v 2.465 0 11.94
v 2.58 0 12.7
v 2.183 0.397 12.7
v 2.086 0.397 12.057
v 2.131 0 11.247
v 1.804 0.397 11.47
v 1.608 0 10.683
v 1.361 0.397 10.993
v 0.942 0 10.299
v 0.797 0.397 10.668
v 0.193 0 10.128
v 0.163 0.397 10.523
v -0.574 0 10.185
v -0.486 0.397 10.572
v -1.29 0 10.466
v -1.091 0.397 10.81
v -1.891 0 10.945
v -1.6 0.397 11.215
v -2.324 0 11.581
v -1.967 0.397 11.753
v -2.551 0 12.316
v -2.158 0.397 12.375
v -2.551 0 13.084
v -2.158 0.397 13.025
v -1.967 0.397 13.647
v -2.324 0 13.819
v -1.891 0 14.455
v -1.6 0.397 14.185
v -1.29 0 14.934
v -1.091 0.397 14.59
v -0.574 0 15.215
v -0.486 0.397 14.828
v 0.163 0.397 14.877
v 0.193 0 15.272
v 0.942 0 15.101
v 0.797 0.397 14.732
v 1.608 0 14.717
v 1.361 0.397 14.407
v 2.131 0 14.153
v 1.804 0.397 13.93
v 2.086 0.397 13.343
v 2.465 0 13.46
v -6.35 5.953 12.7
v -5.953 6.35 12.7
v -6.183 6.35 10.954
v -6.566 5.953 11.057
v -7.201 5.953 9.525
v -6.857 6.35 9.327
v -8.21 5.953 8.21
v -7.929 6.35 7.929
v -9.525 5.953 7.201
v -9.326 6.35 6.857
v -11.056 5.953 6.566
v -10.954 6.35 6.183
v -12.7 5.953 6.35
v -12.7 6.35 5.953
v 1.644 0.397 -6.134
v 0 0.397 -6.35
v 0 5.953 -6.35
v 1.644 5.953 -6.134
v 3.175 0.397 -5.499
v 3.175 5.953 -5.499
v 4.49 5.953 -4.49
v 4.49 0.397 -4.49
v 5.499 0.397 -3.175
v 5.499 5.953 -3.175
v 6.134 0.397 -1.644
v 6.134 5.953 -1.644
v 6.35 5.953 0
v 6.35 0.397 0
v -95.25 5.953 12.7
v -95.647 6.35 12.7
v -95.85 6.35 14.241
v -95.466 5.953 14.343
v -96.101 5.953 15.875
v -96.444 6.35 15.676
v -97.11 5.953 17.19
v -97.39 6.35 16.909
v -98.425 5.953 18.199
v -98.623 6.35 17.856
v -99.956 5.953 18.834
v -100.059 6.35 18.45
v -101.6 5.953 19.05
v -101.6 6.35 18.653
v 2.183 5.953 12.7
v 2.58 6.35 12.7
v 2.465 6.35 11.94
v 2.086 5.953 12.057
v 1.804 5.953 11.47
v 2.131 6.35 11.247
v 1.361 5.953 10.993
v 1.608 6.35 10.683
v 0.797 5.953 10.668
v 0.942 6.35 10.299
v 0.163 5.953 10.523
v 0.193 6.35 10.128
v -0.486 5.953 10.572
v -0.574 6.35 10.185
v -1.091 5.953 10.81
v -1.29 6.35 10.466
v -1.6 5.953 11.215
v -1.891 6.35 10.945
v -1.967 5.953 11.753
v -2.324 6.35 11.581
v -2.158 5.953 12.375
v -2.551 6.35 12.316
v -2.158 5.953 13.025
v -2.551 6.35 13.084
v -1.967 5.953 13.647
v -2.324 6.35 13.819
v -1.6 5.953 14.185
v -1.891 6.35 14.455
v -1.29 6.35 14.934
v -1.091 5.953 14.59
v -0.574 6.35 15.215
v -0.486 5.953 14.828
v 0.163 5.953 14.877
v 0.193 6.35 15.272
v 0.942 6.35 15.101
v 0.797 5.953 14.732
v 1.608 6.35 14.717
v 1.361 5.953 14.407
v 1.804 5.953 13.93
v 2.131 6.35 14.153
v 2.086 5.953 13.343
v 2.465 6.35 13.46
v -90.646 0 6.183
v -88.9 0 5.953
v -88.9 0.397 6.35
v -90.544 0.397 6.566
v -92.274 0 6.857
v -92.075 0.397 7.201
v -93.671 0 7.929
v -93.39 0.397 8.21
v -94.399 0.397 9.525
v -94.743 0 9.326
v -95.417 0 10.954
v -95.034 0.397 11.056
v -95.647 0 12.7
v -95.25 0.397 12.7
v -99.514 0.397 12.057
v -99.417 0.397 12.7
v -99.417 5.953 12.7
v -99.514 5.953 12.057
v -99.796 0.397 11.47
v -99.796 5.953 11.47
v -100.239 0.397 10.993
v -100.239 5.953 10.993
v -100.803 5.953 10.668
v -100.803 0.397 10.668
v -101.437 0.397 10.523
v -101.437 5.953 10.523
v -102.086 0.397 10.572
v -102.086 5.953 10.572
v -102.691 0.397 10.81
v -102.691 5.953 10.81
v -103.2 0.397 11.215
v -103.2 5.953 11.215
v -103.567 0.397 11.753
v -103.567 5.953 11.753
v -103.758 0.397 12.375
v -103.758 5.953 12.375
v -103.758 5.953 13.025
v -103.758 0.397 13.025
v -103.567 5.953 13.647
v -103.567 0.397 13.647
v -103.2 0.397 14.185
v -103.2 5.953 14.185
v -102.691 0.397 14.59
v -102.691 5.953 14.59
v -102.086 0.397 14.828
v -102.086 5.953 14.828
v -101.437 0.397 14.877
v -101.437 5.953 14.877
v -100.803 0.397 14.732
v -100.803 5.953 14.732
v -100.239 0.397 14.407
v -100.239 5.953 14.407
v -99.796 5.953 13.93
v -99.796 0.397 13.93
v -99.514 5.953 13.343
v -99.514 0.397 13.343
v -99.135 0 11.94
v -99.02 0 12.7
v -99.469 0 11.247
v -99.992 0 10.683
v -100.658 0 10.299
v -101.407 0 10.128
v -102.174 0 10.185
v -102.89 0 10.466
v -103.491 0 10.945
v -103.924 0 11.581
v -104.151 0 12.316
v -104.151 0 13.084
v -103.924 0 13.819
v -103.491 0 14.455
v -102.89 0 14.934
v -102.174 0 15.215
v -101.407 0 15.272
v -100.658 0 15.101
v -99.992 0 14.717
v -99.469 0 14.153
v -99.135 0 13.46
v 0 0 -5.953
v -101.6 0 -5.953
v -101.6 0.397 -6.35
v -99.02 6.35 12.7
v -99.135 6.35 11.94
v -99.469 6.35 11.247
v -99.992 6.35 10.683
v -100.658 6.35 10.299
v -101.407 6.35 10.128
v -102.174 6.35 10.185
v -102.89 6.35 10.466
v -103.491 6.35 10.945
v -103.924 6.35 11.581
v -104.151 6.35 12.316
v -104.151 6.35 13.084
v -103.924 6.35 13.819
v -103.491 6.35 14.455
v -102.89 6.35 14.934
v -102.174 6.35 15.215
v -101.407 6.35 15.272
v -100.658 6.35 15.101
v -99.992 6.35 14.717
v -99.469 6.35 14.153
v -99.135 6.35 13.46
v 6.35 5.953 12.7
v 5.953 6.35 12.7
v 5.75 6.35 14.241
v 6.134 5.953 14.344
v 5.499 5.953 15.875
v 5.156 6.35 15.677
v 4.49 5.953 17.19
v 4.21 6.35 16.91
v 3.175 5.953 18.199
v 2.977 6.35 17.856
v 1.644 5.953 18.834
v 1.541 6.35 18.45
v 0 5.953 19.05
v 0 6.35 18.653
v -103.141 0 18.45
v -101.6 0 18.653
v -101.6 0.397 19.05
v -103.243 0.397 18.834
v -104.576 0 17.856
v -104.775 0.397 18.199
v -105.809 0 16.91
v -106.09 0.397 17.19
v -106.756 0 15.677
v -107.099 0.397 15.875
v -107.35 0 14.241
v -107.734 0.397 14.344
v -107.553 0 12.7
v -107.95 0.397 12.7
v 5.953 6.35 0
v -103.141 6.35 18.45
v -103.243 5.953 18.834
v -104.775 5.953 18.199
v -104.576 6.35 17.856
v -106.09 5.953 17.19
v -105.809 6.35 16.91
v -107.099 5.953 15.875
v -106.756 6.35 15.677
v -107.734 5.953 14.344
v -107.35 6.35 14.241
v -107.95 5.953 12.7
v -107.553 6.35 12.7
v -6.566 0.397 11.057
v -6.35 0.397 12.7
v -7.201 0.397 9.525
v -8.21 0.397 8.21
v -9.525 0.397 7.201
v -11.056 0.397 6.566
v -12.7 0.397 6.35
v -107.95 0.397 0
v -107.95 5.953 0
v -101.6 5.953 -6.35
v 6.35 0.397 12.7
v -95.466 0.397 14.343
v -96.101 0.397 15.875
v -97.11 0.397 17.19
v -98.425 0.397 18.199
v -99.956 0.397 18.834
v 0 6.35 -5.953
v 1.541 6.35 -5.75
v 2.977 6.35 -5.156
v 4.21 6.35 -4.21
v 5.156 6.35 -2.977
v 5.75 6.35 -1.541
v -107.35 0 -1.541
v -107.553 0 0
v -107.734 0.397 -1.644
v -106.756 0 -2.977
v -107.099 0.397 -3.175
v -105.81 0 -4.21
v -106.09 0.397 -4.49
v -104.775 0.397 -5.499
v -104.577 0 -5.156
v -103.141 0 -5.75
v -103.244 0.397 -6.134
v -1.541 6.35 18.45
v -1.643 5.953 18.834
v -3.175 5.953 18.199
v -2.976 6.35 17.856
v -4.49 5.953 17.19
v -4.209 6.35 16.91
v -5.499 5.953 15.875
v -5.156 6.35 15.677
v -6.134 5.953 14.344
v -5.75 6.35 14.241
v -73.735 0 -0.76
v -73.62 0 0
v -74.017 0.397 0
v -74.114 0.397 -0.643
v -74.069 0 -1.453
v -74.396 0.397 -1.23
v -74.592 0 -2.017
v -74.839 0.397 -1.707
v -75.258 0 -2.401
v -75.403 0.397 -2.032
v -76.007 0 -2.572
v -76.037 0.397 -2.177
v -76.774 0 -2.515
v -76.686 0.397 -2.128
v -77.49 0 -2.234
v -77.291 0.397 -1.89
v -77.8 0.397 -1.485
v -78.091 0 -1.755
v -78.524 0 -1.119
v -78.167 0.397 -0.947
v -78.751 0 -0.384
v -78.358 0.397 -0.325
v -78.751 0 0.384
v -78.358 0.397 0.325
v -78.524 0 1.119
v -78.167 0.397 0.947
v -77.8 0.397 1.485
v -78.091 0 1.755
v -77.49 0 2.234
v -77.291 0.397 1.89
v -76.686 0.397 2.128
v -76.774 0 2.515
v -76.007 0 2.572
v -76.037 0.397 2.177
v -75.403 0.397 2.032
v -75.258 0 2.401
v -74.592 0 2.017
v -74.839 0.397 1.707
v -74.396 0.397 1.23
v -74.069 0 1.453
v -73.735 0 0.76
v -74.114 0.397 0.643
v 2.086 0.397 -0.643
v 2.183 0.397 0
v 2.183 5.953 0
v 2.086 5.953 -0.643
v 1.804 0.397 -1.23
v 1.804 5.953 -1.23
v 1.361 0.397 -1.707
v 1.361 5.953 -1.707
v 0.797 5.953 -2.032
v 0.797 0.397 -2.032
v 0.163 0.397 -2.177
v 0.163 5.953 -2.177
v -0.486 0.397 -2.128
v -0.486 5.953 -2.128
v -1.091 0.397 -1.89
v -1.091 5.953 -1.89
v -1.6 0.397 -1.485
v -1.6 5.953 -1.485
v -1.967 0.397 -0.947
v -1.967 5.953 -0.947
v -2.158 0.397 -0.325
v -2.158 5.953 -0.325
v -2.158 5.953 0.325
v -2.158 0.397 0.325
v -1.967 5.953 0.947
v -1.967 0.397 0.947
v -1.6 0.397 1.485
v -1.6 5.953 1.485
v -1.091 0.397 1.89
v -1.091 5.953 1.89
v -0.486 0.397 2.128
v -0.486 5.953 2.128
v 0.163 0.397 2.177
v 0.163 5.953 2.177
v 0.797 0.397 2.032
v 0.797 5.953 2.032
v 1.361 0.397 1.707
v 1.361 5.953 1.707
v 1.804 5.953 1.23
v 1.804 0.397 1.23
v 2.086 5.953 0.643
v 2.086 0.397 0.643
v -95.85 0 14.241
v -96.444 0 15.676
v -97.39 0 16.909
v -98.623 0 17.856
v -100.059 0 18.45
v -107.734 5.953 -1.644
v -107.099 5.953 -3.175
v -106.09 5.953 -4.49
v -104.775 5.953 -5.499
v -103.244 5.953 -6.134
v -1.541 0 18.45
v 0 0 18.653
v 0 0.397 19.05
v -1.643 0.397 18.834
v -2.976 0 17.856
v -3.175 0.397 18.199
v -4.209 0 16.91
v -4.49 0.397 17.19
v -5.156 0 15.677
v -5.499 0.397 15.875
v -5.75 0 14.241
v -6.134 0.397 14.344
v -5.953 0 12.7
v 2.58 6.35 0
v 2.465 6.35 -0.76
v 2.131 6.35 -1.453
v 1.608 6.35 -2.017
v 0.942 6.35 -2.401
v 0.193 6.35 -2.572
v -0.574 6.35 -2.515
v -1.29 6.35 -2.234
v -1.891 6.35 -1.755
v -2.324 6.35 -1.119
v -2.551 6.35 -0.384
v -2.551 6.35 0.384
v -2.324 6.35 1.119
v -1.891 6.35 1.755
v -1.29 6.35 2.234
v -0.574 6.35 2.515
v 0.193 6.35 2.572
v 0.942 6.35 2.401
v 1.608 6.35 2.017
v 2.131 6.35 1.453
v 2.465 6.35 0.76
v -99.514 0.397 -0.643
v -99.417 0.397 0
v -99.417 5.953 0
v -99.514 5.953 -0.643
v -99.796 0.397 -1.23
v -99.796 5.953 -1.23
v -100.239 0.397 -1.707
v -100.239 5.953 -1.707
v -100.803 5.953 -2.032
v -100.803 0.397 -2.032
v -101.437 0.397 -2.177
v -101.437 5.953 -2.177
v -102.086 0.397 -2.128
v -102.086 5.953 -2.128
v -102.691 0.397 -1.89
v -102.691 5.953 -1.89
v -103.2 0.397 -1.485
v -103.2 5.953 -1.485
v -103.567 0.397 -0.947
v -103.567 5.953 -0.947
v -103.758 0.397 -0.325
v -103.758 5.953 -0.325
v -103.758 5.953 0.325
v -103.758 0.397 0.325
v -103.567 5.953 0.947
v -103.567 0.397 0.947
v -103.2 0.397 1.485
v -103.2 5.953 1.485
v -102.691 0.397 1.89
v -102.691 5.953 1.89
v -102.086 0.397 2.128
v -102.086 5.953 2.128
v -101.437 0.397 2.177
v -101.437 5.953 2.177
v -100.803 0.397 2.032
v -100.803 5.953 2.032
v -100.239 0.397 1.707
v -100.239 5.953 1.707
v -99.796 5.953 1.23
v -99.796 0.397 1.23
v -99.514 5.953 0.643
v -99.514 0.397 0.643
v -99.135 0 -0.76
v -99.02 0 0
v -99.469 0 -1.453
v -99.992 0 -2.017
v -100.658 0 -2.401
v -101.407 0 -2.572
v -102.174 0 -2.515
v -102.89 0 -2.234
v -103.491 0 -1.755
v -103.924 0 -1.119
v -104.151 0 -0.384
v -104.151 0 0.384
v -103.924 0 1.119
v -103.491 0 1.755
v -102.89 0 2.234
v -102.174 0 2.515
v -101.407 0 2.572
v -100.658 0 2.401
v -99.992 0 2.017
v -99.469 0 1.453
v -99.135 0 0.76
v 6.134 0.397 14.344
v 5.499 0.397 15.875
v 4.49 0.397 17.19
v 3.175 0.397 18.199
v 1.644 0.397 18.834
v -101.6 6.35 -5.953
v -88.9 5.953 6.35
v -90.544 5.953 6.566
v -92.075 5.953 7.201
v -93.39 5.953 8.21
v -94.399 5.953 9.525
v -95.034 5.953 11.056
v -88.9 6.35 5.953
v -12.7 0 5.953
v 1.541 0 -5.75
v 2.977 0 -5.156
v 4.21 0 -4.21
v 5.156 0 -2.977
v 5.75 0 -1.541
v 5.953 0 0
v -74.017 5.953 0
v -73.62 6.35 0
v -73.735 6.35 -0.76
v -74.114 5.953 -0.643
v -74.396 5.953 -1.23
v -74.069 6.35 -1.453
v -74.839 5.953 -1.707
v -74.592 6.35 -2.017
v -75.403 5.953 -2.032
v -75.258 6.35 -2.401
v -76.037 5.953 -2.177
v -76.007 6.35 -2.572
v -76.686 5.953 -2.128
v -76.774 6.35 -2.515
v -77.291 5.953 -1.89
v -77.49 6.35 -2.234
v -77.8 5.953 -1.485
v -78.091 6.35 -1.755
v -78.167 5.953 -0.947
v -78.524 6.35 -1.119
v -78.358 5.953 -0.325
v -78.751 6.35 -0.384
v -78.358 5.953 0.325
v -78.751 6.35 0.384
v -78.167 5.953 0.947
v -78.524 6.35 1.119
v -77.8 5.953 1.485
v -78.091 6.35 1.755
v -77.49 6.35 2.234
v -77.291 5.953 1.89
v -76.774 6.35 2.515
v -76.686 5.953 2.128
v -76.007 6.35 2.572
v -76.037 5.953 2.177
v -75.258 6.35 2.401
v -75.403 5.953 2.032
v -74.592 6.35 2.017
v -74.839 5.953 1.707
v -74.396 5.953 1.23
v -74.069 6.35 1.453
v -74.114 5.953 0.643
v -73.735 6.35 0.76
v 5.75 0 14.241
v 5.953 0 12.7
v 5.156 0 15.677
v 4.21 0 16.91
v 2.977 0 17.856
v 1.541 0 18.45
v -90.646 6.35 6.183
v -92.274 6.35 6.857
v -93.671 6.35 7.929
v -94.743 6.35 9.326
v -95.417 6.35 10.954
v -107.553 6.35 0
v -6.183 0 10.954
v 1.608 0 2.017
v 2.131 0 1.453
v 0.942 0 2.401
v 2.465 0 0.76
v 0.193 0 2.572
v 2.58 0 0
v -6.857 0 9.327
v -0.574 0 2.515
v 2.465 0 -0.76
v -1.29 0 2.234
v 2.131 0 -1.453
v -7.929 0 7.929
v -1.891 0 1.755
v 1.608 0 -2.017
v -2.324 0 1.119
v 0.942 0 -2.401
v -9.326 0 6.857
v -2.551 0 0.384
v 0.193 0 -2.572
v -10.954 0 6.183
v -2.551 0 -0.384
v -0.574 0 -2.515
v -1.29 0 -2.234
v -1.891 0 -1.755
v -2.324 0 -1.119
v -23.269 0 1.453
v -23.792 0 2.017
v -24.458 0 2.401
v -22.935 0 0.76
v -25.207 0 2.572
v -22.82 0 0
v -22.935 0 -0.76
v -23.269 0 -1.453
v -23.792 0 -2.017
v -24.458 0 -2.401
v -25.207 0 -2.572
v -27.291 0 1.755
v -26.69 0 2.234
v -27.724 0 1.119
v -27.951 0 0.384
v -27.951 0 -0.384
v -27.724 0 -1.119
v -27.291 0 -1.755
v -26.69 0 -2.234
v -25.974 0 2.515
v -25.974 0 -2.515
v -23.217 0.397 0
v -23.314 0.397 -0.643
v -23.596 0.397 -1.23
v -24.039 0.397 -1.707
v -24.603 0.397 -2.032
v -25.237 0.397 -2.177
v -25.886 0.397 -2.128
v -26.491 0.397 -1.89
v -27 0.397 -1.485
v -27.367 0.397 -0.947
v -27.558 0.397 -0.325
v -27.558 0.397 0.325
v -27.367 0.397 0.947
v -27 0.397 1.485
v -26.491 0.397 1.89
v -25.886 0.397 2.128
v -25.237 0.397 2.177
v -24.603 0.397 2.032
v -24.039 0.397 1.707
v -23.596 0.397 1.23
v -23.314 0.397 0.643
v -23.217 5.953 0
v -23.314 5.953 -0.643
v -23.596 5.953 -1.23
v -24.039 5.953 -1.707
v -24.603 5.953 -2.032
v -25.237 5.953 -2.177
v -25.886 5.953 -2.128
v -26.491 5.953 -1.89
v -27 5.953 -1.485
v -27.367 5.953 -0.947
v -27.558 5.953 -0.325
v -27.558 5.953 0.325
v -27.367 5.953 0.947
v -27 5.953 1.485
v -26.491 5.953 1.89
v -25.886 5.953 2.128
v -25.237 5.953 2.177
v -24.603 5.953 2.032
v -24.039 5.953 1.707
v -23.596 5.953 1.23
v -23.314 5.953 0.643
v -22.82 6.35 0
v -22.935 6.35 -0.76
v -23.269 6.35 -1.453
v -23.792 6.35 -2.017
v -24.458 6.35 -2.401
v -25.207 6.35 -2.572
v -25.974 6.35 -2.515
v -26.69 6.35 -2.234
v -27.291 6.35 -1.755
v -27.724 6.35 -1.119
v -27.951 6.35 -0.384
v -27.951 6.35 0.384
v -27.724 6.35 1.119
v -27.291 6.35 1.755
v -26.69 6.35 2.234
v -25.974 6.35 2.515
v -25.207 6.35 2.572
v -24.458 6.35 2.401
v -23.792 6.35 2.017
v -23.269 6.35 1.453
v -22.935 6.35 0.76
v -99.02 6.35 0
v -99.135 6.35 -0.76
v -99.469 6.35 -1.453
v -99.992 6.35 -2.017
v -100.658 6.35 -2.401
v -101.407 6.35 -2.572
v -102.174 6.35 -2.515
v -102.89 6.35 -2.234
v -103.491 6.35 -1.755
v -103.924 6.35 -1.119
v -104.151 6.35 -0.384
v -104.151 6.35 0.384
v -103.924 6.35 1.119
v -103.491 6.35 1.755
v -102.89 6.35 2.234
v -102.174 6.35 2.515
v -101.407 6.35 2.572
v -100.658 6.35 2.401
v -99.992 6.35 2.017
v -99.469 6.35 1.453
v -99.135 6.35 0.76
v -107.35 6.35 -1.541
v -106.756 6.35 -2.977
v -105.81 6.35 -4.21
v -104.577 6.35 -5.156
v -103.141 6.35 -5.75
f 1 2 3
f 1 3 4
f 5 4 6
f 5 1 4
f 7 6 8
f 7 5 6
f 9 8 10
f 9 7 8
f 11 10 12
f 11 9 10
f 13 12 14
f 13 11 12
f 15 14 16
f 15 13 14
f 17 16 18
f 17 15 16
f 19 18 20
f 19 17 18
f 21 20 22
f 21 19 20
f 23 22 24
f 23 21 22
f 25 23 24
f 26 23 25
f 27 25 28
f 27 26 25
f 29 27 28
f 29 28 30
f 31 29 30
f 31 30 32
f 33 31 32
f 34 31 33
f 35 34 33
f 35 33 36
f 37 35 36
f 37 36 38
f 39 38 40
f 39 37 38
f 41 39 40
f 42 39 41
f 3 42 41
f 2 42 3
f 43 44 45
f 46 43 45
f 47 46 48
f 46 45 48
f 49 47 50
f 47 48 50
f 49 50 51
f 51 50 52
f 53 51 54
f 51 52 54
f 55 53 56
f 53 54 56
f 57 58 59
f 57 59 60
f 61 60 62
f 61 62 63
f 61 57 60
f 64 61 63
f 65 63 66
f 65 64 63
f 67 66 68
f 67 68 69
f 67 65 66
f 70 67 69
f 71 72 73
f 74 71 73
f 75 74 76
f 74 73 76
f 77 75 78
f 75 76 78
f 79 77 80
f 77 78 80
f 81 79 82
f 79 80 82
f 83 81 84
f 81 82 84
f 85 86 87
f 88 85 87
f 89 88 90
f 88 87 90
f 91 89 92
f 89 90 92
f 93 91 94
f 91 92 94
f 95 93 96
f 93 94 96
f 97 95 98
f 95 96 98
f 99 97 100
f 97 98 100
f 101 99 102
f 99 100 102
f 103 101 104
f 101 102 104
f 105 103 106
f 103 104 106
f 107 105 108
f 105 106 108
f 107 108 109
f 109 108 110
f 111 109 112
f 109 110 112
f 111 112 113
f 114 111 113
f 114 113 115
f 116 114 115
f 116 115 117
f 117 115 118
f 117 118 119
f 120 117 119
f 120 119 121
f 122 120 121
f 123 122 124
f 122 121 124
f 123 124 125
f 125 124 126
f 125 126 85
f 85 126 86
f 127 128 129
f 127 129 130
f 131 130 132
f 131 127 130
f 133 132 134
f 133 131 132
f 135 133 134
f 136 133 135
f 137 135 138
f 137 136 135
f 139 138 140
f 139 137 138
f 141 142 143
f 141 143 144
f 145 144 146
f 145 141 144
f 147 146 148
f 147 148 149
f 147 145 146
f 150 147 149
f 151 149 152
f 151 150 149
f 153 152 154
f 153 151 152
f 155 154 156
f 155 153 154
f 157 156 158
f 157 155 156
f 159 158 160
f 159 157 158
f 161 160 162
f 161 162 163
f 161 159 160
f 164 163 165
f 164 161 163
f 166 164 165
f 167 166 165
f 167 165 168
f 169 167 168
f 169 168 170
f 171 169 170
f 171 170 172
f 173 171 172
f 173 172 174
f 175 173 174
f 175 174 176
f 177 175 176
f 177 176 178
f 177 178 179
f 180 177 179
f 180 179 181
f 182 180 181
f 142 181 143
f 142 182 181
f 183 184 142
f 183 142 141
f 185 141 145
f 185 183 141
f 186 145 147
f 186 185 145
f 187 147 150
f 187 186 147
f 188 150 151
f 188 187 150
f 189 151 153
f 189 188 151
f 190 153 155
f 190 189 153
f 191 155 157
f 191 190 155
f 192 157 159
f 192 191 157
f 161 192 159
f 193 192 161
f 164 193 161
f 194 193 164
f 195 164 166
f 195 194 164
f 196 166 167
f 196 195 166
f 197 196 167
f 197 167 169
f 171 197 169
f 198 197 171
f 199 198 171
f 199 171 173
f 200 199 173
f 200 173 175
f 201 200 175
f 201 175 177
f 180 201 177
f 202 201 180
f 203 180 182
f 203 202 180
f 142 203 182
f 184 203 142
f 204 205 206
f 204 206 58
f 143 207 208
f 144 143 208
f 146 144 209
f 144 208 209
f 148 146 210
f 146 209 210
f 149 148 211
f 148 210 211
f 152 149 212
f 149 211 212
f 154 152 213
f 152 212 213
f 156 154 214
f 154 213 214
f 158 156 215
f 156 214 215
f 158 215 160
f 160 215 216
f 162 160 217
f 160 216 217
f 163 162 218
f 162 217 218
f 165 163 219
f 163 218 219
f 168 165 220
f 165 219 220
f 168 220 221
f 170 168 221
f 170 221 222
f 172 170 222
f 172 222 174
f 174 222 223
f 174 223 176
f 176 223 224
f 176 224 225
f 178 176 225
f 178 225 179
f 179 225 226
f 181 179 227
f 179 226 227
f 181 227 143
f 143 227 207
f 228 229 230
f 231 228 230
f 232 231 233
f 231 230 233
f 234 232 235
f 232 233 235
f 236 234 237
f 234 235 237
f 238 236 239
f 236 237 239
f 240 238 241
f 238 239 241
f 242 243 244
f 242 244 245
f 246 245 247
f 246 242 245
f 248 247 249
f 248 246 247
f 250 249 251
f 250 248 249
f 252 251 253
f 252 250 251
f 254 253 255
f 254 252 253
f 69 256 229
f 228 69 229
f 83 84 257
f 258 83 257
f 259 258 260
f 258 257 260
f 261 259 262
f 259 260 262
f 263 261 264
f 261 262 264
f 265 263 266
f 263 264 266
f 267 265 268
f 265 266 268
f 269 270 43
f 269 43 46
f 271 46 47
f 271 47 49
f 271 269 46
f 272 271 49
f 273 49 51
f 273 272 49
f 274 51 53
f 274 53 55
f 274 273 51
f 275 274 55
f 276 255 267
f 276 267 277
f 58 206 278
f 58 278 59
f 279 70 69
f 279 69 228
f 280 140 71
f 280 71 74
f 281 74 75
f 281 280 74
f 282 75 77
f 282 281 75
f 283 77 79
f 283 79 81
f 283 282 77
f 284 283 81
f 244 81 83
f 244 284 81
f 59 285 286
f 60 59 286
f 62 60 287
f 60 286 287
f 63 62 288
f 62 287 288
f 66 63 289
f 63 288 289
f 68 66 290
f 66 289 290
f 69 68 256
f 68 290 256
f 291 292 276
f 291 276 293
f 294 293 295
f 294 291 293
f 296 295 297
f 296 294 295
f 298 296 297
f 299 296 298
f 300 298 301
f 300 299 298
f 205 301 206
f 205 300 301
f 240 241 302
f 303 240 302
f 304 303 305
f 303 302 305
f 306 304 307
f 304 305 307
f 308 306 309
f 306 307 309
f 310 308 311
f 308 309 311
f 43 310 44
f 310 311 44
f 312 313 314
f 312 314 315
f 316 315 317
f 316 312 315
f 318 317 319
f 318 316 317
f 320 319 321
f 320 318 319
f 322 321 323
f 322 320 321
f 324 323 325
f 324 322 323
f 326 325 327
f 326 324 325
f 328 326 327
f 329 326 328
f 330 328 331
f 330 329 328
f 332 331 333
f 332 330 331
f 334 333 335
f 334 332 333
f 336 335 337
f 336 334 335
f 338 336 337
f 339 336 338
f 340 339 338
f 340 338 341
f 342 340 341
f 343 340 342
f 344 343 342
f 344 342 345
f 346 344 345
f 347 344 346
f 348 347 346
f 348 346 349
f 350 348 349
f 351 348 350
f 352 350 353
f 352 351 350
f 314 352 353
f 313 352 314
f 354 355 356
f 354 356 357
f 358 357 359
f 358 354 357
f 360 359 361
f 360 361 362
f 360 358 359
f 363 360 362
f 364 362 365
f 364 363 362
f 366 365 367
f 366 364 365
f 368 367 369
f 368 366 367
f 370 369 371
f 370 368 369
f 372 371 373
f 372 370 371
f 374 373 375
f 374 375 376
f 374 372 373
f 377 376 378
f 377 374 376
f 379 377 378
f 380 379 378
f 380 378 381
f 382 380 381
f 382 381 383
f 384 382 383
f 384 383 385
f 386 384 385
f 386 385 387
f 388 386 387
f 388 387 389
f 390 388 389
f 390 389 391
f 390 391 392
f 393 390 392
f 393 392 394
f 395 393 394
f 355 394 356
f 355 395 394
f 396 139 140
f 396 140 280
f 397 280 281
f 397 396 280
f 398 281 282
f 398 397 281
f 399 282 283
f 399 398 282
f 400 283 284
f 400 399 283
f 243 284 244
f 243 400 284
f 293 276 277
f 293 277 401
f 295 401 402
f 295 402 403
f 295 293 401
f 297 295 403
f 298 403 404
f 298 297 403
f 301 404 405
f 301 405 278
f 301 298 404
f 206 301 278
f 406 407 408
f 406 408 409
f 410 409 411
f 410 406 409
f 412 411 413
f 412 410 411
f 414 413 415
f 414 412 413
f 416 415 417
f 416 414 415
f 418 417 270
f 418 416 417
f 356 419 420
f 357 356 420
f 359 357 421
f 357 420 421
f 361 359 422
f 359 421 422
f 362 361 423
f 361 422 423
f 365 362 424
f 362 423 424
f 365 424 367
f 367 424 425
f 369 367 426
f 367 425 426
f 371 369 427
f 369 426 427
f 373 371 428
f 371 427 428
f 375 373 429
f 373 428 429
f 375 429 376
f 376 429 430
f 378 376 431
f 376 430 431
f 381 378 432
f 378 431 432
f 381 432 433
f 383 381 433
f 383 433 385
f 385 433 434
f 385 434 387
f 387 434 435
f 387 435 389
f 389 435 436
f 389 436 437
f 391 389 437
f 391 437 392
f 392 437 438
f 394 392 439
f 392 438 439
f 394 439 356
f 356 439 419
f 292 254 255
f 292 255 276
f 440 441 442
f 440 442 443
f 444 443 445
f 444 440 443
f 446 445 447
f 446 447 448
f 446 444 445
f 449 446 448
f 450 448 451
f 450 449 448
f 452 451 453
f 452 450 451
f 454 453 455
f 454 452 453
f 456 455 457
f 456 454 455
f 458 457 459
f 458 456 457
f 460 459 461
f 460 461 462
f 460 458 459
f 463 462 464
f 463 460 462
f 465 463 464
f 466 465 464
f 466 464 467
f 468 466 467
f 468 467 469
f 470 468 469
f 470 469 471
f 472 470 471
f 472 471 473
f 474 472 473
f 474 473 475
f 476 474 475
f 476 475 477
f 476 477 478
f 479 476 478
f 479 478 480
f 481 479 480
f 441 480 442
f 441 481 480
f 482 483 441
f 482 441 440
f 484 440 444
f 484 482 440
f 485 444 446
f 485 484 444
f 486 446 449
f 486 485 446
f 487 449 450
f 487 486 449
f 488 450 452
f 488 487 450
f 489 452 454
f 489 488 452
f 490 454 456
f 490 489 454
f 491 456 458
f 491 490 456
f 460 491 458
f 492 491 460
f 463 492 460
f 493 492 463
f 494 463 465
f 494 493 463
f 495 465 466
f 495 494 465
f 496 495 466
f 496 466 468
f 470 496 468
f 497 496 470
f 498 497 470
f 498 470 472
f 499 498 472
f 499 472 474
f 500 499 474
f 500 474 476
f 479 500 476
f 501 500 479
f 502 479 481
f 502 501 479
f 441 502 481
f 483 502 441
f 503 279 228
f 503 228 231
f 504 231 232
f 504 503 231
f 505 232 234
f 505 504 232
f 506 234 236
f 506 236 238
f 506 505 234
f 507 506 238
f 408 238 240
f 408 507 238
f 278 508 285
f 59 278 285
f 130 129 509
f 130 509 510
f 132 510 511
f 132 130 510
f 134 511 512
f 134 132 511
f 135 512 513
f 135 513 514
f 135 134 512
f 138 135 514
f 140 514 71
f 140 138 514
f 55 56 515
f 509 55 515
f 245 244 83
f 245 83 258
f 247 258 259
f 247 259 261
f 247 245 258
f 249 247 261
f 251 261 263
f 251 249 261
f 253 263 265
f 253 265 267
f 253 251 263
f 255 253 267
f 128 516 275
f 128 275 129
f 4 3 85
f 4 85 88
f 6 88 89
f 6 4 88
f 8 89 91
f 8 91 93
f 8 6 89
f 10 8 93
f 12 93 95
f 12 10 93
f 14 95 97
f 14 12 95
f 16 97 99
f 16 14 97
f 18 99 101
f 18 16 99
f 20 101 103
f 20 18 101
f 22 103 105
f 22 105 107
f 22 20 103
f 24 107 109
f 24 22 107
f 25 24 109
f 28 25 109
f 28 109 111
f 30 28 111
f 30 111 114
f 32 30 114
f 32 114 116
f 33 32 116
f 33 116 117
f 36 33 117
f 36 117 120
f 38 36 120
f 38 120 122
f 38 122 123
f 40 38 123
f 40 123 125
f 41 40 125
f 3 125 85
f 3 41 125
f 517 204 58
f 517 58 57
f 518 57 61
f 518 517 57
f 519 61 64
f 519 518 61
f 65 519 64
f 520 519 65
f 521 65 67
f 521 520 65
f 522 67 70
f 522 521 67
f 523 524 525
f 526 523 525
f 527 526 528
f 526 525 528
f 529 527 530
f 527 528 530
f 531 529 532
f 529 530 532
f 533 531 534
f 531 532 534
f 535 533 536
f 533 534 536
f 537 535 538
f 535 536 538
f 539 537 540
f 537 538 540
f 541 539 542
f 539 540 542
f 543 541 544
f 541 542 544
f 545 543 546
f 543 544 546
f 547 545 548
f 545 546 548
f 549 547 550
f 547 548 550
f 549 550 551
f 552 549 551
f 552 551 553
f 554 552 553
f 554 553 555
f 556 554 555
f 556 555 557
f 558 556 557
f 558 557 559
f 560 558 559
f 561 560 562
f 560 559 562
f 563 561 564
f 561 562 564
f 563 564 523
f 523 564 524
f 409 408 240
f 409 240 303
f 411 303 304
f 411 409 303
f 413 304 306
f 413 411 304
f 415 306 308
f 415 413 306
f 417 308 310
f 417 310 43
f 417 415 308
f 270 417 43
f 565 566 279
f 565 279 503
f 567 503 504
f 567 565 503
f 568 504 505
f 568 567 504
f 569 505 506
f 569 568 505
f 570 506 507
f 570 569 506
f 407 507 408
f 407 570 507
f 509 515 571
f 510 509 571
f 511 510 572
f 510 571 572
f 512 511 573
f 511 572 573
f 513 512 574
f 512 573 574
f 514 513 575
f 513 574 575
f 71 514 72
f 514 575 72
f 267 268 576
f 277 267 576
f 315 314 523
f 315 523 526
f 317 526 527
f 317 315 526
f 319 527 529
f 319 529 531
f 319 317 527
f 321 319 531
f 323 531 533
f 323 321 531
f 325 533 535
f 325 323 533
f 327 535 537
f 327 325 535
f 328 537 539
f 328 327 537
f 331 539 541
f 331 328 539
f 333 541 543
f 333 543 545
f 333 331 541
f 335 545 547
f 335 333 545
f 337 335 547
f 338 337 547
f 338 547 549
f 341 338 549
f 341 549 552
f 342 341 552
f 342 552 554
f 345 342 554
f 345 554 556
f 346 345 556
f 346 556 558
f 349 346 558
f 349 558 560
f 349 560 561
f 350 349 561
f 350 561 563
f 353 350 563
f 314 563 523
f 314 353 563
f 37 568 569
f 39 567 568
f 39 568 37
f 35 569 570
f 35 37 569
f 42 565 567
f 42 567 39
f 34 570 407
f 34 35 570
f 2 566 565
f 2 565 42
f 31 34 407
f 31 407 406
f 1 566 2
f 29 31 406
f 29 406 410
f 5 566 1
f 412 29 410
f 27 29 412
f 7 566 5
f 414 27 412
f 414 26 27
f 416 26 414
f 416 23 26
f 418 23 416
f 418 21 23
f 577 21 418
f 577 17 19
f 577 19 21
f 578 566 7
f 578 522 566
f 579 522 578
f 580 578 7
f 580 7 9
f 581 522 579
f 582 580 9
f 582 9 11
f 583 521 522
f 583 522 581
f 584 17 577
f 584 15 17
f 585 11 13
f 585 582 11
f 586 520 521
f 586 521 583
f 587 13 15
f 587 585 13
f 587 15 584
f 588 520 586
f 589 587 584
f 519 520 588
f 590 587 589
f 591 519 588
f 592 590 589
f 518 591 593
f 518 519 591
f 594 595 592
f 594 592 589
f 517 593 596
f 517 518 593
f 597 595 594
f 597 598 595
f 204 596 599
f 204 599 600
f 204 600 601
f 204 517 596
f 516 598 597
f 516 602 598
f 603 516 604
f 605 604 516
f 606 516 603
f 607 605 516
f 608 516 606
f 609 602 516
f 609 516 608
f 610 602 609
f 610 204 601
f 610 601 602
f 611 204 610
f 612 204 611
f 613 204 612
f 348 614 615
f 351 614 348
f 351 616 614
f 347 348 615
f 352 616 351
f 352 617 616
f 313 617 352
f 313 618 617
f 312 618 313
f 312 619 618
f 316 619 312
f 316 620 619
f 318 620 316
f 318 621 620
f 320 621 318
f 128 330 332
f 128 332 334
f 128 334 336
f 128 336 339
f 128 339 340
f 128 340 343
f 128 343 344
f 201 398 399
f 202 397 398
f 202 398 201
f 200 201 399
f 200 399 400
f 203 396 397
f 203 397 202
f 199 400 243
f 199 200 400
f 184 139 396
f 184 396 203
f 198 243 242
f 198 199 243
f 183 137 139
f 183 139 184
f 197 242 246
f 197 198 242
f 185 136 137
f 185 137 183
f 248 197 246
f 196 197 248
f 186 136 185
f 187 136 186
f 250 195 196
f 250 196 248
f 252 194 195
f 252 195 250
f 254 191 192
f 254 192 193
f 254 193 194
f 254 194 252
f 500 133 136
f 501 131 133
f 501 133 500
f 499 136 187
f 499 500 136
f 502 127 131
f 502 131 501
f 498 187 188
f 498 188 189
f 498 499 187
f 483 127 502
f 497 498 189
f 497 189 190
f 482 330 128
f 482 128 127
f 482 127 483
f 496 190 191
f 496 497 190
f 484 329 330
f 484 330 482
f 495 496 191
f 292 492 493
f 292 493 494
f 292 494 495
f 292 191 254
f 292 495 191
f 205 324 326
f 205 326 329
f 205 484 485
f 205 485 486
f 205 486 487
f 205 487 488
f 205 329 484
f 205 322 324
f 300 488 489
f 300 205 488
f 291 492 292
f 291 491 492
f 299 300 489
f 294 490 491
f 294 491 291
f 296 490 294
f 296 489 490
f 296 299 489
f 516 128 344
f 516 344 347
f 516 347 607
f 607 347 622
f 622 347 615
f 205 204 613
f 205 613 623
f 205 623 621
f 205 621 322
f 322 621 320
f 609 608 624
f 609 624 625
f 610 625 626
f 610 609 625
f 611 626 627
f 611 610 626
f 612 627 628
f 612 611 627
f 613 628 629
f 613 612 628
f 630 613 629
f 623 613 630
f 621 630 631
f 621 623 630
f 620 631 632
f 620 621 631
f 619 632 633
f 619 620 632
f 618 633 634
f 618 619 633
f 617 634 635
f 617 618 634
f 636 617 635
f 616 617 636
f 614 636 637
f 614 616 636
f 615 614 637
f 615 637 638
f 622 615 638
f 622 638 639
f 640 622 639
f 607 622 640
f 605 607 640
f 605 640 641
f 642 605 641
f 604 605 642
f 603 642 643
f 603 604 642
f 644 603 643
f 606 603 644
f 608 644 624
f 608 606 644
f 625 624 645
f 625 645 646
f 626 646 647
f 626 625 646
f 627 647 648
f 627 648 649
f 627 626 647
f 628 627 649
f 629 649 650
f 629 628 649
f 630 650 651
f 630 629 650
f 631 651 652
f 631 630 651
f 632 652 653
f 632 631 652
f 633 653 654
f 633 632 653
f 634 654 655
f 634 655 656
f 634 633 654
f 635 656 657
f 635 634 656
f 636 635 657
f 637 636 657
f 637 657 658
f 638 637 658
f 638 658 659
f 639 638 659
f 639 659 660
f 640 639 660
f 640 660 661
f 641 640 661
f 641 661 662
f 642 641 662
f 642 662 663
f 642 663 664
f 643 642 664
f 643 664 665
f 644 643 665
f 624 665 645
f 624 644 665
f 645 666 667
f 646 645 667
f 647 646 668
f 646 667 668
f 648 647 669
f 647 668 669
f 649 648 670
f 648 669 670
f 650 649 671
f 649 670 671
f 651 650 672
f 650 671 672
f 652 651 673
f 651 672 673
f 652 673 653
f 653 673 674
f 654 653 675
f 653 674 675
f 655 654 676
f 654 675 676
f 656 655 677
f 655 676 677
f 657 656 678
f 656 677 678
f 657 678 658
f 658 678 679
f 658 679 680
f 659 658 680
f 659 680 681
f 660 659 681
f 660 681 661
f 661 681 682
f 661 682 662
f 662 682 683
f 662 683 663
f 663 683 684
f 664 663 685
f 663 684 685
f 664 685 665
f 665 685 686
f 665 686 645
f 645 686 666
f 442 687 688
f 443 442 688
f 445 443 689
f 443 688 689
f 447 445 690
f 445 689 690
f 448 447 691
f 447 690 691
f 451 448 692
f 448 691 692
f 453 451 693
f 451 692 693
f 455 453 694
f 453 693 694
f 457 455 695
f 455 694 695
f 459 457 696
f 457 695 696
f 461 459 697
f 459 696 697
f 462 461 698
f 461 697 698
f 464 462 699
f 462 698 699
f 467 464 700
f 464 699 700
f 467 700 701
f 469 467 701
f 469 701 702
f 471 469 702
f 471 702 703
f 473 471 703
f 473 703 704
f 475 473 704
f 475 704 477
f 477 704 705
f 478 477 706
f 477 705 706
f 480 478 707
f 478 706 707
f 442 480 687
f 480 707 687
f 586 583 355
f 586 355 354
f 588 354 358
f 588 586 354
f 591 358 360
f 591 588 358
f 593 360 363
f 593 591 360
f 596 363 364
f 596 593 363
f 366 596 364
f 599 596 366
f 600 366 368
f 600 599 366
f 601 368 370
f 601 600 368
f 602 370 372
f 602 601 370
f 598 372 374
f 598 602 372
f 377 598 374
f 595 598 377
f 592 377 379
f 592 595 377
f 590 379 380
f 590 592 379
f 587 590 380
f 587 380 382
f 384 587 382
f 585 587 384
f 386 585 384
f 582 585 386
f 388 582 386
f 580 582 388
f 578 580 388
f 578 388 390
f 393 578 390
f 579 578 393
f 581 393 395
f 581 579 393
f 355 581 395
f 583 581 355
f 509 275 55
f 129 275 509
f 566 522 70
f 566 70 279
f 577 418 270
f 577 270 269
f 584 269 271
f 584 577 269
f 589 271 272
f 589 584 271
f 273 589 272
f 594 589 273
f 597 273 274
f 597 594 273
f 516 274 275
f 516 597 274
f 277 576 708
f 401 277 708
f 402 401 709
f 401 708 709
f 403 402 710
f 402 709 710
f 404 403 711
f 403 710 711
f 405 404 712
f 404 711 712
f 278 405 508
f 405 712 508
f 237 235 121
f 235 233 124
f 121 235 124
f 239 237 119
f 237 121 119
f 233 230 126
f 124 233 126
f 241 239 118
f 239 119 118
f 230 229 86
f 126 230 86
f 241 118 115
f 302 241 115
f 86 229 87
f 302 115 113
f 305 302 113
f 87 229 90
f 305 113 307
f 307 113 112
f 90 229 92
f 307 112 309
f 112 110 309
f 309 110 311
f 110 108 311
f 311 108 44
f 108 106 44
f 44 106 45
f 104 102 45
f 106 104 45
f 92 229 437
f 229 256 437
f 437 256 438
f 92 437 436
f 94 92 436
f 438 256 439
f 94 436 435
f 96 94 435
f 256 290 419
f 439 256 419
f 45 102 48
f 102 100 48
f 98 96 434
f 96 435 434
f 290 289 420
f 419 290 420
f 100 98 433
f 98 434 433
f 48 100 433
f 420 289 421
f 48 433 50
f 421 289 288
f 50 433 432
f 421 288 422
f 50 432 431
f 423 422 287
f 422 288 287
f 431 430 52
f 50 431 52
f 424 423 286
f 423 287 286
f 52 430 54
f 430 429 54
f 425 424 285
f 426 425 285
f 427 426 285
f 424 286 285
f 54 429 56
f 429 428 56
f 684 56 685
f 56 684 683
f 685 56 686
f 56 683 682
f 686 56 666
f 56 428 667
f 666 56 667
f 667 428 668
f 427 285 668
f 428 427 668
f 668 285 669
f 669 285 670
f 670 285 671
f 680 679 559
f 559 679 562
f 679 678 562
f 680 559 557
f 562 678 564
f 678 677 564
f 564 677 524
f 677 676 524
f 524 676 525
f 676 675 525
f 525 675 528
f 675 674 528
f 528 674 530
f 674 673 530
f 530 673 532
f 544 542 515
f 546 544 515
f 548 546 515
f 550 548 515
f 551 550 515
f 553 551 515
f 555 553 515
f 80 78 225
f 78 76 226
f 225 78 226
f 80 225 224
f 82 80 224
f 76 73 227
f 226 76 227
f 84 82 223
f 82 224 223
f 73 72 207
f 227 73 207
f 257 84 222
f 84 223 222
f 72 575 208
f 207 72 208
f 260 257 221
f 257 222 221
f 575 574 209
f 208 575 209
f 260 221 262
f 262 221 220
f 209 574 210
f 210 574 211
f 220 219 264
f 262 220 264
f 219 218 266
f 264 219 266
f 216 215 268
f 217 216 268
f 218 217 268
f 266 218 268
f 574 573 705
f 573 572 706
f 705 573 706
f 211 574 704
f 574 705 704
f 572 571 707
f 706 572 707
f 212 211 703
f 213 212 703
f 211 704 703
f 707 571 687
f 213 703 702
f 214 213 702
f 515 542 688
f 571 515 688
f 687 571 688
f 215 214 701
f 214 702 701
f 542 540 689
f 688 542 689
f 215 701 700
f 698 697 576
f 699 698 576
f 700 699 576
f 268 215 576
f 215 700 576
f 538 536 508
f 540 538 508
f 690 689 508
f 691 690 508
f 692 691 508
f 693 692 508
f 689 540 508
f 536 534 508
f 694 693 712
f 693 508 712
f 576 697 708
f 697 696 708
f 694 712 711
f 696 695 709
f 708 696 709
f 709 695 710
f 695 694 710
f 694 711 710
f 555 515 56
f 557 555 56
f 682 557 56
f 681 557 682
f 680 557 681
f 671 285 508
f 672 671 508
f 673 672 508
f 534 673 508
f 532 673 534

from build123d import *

# Parameters (mm, degrees)
SKETCH1_R           = 2.1828125
BOSS_EXTRUDE1_DEPTH = 6.35
CHAMFER1_SIZE       = 0.396875


with BuildPart() as part:
    # Sketch1 → Boss-Extrude1 (new body)
    with BuildSketch(Plane(origin=(0, 0, 0), x_dir=(1, 0, 0), z_dir=(0, 1, 0))):
        with BuildLine():
            Line((-101.600254, 6.35), (0.000254, 6.35))
            ThreePointArc((0.000254, 6.35), (4.490202455, 4.490202455), (6.35, 0.000254))
            Line((6.35, 0.000254), (6.35, -12.700254))
            ThreePointArc((6.35, -12.700254), (4.490202455, -17.190202455), (0.000254, -19.05))
            ThreePointArc((0.000254, -19.05), (-4.490202455, -17.190202455), (-6.35, -12.700254))
            ThreePointArc((-6.35, -12.700254), (-8.209797545, -8.209797545), (-12.699746, -6.35))
            Line((-12.699746, -6.35), (-88.900254, -6.35))
            ThreePointArc((-88.900254, -6.35), (-93.390202455, -8.209797545), (-95.25, -12.699746))
            ThreePointArc((-95.25, -12.699746), (-97.109797545, -17.190202455), (-101.599746, -19.05))
            ThreePointArc((-101.599746, -19.05), (-106.090202455, -17.190202455), (-107.95, -12.700254))
            Line((-107.95, -12.700254), (-107.95, 0.000254))
            ThreePointArc((-107.95, 0.000254), (-106.090202455, 4.490202455), (-101.600254, 6.35))
        make_face()
        Circle(SKETCH1_R, mode=Mode.SUBTRACT)
        with Locations((-25.4, 0)):
            Circle(SKETCH1_R, mode=Mode.SUBTRACT)
        with Locations((-76.2, 0)):
            Circle(SKETCH1_R, mode=Mode.SUBTRACT)
        with Locations((-101.6, 0)):
            Circle(SKETCH1_R, mode=Mode.SUBTRACT)
        with Locations((-101.6, -12.7)):
            Circle(SKETCH1_R, mode=Mode.SUBTRACT)
        with Locations((0, -12.7)):
            Circle(SKETCH1_R, mode=Mode.SUBTRACT)
    extrude(amount=BOSS_EXTRUDE1_DEPTH)

    # Chamfer1
    chamfer1_edges = [part.edges().sort_by_distance(p)[0] for p in [
        (-4.490022844, 6.35, 17.19038206),
        (-50.8, 0, 6.35),
        (-93.390202455, 0, 8.209797545),
        (-97.10961794, 0, 17.190022844),
        (-4.490022844, 6.35, 17.19038206),
        (-97.10961794, 0, 17.190022844),
        (-106.090022844, 0, 17.19038206),
        (-106.090022844, 0, 17.19038206),
        (-107.95, 0, 6.35),
        (-106.090202455, 0, -4.490202455),
        (-50.8, 0, -6.35),
        (4.490202455, 0, -4.490202455),
        (6.35, 0, 6.35),
        (4.490202455, 0, 17.190202455),
        (-4.490022844, 0, 17.19038206),
        (4.490202455, 6.35, 17.190202455),
        (-4.490022844, 0, 17.19038206),
        (-8.20961794, 0, 8.209977156),
        (-8.20961794, 0, 8.209977156),
        (6.35, 6.35, 6.35),
        (4.490202455, 6.35, -4.490202455),
        (-50.8, 6.35, -6.35),
        (-106.090202455, 6.35, -4.490202455),
        (-2.1828125, 0, 0),
        (-2.1828125, 6.35, 0),
        (-107.95, 6.35, 6.35),
        (-27.5828125, 0, 0),
        (-27.5828125, 6.35, 0),
        (-106.090022844, 6.35, 17.19038206),
        (-78.3828125, 0, 0),
        (-78.3828125, 6.35, 0),
        (-106.090022844, 6.35, 17.19038206),
        (-8.20961794, 6.35, 8.209977156),
        (-103.7828125, 0, 0),
        (-103.7828125, 6.35, 0),
        (-97.10961794, 6.35, 17.190022844),
        (-103.7828125, 0, 12.7),
        (-103.7828125, 6.35, 12.7),
        (-97.10961794, 6.35, 17.190022844),
        (-2.1828125, 0, 12.7),
        (-2.1828125, 6.35, 12.7),
        (-93.390202455, 6.35, 8.209797545),
        (-50.8, 6.35, 6.35),
        (-8.20961794, 6.35, 8.209977156),
    ]]
    chamfer(chamfer1_edges, length=CHAMFER1_SIZE)


solid = part.part
